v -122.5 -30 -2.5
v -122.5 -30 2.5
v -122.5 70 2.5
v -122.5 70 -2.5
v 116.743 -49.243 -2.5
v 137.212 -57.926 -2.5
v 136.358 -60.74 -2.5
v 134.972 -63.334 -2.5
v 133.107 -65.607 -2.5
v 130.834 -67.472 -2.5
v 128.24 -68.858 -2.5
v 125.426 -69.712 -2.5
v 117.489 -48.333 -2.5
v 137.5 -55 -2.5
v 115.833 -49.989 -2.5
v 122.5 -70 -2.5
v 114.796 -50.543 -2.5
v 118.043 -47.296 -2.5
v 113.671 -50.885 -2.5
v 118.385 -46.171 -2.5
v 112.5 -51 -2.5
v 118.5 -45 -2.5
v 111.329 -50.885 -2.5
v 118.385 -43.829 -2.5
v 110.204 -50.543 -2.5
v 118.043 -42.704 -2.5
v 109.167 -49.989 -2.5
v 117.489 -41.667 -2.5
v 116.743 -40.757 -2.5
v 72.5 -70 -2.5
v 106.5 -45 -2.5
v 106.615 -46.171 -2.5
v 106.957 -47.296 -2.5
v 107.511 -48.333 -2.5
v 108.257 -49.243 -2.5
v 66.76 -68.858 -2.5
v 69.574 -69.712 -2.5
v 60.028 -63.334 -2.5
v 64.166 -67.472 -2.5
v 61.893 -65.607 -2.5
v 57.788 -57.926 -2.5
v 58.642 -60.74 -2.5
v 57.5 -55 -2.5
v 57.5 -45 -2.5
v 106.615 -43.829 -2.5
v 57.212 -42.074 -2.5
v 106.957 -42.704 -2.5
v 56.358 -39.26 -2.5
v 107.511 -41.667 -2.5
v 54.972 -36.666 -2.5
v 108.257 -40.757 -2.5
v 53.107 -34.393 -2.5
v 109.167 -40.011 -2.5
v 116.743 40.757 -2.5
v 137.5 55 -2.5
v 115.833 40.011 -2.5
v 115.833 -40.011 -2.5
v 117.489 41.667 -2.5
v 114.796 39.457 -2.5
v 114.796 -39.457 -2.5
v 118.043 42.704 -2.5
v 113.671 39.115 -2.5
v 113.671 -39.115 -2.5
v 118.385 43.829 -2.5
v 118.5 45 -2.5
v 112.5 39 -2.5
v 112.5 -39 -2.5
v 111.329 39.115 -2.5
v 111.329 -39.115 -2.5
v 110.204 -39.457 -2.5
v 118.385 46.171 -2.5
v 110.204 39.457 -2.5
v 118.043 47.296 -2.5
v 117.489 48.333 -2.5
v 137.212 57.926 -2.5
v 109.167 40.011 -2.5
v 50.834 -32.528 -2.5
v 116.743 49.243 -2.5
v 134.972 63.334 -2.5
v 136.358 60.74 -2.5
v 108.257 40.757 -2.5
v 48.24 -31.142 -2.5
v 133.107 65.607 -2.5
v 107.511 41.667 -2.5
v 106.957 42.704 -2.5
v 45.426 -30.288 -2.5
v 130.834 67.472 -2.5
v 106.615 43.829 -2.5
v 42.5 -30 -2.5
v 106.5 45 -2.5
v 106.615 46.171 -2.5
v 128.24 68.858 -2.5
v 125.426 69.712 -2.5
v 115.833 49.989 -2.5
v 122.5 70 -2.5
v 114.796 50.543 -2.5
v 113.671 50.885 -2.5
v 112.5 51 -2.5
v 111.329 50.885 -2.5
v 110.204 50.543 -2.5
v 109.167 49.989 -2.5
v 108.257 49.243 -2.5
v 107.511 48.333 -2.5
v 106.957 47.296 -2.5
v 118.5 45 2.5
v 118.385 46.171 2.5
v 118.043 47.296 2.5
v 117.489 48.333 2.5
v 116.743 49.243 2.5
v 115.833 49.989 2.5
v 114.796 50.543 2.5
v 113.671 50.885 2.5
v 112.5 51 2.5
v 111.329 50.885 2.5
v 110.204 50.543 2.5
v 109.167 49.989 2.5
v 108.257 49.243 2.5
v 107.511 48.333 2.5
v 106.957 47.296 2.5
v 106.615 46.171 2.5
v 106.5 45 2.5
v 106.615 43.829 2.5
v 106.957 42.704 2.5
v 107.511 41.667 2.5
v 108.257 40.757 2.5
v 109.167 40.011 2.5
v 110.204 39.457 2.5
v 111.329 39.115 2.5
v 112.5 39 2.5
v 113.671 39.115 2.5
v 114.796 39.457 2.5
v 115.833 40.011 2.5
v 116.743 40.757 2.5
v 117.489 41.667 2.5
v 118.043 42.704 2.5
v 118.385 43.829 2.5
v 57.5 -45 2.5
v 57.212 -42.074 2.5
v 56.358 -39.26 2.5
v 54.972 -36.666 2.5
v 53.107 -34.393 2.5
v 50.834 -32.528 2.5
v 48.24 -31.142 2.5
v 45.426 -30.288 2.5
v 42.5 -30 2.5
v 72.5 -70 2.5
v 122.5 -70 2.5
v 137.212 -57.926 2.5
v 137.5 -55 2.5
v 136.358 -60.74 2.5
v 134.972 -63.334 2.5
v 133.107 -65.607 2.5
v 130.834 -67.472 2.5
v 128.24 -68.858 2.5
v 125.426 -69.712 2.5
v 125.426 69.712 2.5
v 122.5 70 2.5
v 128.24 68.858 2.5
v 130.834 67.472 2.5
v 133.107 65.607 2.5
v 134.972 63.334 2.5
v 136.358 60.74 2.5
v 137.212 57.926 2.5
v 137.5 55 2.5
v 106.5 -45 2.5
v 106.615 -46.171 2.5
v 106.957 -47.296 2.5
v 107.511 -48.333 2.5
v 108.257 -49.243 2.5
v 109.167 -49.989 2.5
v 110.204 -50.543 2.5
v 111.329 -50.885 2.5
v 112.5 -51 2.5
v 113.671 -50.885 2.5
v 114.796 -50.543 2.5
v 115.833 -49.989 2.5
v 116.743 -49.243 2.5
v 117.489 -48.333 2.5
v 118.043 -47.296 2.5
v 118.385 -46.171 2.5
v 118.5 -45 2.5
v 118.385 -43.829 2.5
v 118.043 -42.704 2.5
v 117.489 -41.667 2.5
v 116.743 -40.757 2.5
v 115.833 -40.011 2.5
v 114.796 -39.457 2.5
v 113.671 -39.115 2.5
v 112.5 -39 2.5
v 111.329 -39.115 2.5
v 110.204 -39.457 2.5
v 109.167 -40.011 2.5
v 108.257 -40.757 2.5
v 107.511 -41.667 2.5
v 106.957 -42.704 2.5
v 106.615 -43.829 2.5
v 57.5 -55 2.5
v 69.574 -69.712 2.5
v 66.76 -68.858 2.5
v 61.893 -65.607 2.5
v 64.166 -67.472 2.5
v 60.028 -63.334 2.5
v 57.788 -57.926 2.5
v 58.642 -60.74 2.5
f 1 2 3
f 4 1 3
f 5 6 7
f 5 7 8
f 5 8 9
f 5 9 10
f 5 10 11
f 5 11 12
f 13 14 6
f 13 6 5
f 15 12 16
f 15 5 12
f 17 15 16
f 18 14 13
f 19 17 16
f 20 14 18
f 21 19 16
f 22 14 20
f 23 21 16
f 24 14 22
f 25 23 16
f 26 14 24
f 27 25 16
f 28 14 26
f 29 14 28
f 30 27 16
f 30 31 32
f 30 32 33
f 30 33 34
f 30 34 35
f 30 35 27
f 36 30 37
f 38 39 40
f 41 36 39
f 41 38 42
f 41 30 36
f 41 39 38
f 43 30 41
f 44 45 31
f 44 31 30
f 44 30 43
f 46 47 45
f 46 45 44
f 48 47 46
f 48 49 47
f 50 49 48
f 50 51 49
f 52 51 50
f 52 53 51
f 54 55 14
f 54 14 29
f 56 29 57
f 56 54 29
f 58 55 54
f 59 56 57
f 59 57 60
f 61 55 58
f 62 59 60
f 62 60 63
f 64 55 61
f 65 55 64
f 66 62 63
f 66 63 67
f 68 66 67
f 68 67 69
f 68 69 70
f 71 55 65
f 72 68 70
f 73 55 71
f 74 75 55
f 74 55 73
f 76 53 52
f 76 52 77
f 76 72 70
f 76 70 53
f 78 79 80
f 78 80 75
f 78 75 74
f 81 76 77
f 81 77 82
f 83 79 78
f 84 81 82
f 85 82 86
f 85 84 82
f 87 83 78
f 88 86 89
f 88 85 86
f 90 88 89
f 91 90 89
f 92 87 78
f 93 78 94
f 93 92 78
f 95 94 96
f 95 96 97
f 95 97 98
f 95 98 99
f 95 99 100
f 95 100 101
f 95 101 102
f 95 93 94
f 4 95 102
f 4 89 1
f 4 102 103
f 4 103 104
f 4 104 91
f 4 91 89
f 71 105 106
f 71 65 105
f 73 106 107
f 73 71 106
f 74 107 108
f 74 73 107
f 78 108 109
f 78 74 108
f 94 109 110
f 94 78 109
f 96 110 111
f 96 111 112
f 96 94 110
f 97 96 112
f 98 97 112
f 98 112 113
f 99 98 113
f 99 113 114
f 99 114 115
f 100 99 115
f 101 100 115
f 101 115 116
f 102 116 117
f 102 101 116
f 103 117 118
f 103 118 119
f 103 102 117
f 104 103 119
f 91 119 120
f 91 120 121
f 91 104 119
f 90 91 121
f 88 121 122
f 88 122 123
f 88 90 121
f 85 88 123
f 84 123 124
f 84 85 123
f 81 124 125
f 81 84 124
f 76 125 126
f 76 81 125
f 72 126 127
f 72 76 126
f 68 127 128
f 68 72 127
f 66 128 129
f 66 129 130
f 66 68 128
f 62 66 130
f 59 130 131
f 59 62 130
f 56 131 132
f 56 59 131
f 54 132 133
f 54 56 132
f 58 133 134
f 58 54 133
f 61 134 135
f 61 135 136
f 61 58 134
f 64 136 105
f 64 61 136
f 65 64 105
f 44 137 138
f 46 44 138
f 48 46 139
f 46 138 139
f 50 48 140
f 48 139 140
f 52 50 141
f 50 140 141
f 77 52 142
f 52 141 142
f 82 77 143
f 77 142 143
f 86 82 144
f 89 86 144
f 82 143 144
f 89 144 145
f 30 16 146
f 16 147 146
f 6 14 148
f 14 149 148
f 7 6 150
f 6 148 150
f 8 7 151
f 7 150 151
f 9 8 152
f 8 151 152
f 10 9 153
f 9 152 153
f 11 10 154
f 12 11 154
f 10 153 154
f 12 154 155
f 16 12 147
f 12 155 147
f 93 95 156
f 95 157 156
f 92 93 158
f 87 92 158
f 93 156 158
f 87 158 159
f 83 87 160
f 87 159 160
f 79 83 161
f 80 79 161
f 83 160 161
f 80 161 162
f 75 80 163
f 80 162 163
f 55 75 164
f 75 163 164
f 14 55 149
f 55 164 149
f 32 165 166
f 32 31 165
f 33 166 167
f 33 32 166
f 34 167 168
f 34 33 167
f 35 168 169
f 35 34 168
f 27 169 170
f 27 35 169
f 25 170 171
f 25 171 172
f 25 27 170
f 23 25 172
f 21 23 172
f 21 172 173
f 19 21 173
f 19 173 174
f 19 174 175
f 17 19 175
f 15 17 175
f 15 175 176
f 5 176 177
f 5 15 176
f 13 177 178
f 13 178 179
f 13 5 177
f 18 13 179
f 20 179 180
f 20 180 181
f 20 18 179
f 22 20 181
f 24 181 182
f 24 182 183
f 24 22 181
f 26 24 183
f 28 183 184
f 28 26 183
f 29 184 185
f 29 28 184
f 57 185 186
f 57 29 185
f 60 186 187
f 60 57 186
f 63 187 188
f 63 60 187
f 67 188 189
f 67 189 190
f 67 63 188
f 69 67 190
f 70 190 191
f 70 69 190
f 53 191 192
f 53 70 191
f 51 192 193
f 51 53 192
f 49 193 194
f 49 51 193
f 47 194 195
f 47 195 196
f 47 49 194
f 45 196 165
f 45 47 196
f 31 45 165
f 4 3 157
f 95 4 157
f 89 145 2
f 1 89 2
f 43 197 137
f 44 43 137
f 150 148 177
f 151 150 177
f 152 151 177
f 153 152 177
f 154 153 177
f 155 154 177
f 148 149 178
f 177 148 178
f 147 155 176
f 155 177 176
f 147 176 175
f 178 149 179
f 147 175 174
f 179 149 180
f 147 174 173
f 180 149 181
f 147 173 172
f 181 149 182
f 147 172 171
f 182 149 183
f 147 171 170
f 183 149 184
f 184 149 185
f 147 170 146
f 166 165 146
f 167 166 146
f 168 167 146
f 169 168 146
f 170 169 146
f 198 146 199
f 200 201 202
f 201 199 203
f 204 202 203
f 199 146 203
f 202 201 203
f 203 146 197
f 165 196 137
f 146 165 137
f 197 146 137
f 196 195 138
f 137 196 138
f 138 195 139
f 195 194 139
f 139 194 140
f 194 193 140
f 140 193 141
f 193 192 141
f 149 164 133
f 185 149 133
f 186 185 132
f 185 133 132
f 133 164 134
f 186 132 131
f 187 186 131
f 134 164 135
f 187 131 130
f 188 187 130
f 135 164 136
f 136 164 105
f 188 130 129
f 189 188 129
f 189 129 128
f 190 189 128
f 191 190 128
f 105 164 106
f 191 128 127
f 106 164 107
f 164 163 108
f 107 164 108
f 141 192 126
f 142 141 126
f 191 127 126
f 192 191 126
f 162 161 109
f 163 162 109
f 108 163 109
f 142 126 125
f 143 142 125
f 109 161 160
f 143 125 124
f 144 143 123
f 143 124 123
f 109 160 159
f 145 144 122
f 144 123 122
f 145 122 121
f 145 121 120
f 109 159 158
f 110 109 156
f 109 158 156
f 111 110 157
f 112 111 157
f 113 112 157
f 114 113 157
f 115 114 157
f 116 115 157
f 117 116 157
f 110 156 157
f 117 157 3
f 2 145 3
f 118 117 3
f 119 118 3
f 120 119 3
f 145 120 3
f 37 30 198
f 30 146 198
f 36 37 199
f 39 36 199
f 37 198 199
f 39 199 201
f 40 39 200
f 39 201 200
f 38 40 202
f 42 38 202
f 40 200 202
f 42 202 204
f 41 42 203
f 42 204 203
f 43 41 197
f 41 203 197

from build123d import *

# Parameters (mm, degrees)
SKETCH1_R           = 6
BOSS_EXTRUDE1_DEPTH = 2.5


with BuildPart() as part:
    # Sketch1 → Boss-Extrude1 (new, symmetric)
    with BuildSketch(Plane.XY):
        with BuildLine():
            Line((-122.5, 70), (122.5, 70))
            ThreePointArc((122.5, 70), (133.106601718, 65.606601718), (137.5, 55))
            Line((137.5, 55), (137.5, -55))
            ThreePointArc((137.5, -55), (133.106601718, -65.606601718), (122.5, -70))
            Line((122.5, -70), (72.5, -70))
            ThreePointArc((72.5, -70), (61.893398282, -65.606601718), (57.5, -55))
            Line((57.5, -55), (57.5, -45))
            ThreePointArc((57.5, -45), (53.106601718, -34.393398282), (42.5, -30))
            Line((42.5, -30), (-122.5, -30))
            Line((-122.5, -30), (-122.5, 70))
        make_face()
        with Locations((112.5, 45)):
            Circle(SKETCH1_R, mode=Mode.SUBTRACT)
        with Locations(Location((112.5, -45, 0), (0, 0, 180))):
            Circle(SKETCH1_R, mode=Mode.SUBTRACT)
    extrude(amount=BOSS_EXTRUDE1_DEPTH, both=True)


solid = part.part
